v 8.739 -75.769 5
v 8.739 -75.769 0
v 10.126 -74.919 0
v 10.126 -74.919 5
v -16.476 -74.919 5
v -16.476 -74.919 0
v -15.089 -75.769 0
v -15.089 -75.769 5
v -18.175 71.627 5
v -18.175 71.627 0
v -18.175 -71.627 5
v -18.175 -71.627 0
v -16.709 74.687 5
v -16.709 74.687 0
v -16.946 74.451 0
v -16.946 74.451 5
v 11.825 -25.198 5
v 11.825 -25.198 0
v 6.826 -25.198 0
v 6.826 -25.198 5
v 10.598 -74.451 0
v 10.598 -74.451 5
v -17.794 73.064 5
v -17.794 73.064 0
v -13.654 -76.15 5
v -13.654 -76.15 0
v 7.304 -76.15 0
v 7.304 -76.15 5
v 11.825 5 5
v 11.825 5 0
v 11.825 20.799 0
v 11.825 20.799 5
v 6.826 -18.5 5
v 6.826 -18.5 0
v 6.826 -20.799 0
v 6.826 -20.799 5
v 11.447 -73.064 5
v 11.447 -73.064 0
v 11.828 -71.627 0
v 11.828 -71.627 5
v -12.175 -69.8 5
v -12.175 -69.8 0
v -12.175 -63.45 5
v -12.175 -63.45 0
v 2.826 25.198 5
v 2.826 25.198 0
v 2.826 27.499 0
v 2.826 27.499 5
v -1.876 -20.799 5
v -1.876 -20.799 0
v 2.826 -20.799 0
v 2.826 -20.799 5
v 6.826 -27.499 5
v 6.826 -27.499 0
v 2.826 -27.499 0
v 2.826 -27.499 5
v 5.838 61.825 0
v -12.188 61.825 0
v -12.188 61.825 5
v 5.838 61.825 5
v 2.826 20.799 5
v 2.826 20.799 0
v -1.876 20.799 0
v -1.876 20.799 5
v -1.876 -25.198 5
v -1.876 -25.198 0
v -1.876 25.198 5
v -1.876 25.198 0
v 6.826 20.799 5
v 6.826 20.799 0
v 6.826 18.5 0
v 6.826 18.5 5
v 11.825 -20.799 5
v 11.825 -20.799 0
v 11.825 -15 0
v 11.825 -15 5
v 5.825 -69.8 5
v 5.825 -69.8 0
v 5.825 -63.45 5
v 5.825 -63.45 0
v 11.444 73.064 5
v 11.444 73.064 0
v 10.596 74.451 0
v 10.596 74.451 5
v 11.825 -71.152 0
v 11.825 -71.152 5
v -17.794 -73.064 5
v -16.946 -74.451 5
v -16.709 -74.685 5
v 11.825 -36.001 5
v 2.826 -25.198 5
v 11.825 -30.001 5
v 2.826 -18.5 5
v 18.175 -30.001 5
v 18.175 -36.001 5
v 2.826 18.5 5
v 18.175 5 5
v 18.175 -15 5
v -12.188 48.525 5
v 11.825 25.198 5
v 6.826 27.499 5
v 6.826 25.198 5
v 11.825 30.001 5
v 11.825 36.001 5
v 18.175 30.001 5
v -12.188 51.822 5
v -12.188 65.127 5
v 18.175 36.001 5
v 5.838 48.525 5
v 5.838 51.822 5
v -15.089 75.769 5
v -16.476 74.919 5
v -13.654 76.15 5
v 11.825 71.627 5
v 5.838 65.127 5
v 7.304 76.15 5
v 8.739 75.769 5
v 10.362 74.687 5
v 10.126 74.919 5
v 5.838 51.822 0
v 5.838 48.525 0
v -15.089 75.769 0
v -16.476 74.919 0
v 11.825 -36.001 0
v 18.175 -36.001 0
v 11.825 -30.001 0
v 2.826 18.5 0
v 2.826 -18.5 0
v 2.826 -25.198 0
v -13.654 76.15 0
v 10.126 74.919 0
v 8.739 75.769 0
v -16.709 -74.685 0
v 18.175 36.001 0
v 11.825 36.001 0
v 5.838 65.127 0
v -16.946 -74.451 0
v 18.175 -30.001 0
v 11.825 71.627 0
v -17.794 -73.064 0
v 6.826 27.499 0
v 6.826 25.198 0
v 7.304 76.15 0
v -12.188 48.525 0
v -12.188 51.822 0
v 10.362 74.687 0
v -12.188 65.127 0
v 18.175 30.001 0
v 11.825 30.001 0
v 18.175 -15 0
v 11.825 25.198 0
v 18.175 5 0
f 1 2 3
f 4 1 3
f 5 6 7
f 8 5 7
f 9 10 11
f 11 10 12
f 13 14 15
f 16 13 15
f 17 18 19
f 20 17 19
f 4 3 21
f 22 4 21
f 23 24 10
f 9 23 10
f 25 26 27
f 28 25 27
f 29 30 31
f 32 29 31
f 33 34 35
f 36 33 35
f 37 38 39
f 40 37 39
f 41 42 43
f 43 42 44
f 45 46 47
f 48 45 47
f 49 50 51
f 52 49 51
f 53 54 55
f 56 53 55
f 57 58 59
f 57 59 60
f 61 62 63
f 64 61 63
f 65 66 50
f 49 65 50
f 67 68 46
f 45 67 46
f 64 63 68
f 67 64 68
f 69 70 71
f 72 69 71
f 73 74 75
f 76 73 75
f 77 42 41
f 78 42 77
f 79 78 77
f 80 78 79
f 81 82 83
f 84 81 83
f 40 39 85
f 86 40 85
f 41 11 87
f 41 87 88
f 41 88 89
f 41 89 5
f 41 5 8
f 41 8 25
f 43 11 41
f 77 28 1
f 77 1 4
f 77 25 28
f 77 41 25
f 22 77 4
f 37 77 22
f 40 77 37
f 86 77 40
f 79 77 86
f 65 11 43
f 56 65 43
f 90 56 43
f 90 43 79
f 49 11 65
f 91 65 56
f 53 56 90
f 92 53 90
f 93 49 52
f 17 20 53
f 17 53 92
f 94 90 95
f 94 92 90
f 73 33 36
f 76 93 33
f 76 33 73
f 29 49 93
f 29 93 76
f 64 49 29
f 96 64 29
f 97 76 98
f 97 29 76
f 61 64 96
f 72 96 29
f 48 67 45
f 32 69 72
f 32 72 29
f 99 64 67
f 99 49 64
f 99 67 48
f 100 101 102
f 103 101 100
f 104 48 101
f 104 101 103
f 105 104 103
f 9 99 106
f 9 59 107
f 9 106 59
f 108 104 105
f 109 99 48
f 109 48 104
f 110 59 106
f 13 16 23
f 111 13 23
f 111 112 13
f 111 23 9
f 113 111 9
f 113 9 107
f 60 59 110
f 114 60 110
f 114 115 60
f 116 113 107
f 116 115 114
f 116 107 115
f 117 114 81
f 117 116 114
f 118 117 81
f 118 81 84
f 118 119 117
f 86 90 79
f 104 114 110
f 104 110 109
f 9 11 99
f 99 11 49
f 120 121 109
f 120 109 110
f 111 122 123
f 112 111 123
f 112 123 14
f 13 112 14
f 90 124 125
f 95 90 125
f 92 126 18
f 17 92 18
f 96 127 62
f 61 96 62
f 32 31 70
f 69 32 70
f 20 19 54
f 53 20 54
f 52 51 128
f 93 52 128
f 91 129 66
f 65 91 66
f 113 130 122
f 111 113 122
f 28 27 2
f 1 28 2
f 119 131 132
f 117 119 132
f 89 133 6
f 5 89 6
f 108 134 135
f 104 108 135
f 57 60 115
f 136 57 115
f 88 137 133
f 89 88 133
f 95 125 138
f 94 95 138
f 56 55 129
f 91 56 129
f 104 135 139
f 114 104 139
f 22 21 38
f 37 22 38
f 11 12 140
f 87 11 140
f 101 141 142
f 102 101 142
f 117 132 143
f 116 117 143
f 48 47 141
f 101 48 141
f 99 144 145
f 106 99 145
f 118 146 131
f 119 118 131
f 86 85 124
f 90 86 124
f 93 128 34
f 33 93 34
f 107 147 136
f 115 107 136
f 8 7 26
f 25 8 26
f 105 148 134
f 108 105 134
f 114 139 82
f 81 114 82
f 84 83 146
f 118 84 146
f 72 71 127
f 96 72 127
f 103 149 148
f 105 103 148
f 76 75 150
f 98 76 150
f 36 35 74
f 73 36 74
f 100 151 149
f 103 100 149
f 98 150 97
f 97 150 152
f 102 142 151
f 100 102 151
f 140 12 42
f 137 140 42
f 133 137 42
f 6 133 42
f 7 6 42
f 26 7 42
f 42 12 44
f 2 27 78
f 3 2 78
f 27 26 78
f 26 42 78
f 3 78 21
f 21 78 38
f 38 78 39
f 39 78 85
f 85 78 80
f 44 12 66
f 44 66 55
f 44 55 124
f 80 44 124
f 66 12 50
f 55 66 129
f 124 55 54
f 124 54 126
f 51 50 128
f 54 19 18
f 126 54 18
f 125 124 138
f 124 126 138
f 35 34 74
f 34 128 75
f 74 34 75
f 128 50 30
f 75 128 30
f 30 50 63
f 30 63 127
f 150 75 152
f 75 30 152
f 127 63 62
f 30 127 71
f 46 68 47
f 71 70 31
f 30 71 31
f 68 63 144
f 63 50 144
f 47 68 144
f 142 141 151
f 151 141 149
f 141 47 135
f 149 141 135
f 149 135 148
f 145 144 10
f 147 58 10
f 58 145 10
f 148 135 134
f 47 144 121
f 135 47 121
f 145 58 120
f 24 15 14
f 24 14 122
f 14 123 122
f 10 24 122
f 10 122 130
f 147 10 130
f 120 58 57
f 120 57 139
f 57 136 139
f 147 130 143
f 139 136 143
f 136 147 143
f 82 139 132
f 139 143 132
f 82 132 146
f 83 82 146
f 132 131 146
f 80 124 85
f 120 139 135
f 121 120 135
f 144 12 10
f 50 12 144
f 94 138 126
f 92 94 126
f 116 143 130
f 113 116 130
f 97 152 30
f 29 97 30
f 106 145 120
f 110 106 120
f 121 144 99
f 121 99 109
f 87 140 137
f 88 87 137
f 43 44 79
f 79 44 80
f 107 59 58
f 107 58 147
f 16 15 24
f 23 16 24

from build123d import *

# Parameters (mm, degrees)
SKETCH1_W           = 18.00098
SKETCH1_H           = 6.35
SKETCH1_W_2         = 18.02638
SKETCH1_H_2         = 3.302
SKETCH1_H_3         = 3.29692
BOSS_EXTRUDE1_DEPTH = 5


with BuildPart() as part:
    # Sketch1 → Boss-Extrude1 (new body)
    with BuildSketch(Plane.XY):
        Polygon((-13.17371, -76.15047), (6.82625, -76.15047), (7.30377, -76.15047), (8.73887, -75.76947), (10.12571, -74.91857), (10.36193, -74.68489), (10.59815, -74.45121), (11.44651, -73.06437), (11.82751, -71.62673), (11.82497, -71.15175), (11.82497, -36.00069), (18.17497, -36.00069), (18.17497, -30.00121), (11.82497, -30.00121), (11.82497, -25.19807), (6.82625, -25.19807), (6.82625, -27.49931), (2.82575, -27.49931), (2.82575, -25.19807), (-1.87579, -25.19807), (-1.87579, -20.79879), (2.82575, -20.79879), (2.82575, -18.50009), (6.82625, -18.50009), (6.82625, -20.79879), (11.82497, -20.79879), (11.82497, -14.99997), (18.17497, -14.99997), (18.17497, 4.99999), (11.82497, 4.99999), (11.82497, 20.79879), (6.82625, 20.79879), (6.82625, 18.50009), (2.82575, 18.50009), (2.82575, 20.79879), (-1.87579, 20.79879), (-1.87579, 25.19807), (2.82575, 25.19807), (2.82575, 27.49931), (6.82625, 27.49931), (6.82625, 25.19807), (11.82497, 25.19807), (11.82497, 30.00121), (18.17497, 30.00121), (18.17497, 36.00069), (11.82497, 36.00069), (11.82497, 71.14921), (11.82497, 71.62673), (11.44397, 73.06437), (10.59561, 74.45121), (10.36193, 74.68743), (10.12571, 74.91857), (8.73887, 75.76947), (7.30377, 76.15047), (6.82625, 76.15047), (-13.17371, 76.15047), (-13.65377, 76.15047), (-15.08887, 75.76947), (-16.47571, 74.91857), (-16.70939, 74.68743), (-16.94561, 74.45121), (-17.79397, 73.06437), (-18.17497, 71.62673), (-18.17497, 71.14921), (-18.17497, -71.15175), (-18.17497, -71.62673), (-17.79397, -73.06437), (-16.94561, -74.45121), (-16.70939, -74.68489), (-16.47571, -74.91857), (-15.08887, -75.76947), (-13.65377, -76.15047), align=None)
        with Locations((-3.175, -66.62547)):
            Rectangle(SKETCH1_W, SKETCH1_H, mode=Mode.SUBTRACT)
        with Locations((-3.175, 63.47587)):
            Rectangle(SKETCH1_W_2, SKETCH1_H_2, mode=Mode.SUBTRACT)
        with Locations((-3.175, 50.17389)):
            Rectangle(SKETCH1_W_2, SKETCH1_H_3, mode=Mode.SUBTRACT)
    extrude(amount=BOSS_EXTRUDE1_DEPTH)


solid = part.part
